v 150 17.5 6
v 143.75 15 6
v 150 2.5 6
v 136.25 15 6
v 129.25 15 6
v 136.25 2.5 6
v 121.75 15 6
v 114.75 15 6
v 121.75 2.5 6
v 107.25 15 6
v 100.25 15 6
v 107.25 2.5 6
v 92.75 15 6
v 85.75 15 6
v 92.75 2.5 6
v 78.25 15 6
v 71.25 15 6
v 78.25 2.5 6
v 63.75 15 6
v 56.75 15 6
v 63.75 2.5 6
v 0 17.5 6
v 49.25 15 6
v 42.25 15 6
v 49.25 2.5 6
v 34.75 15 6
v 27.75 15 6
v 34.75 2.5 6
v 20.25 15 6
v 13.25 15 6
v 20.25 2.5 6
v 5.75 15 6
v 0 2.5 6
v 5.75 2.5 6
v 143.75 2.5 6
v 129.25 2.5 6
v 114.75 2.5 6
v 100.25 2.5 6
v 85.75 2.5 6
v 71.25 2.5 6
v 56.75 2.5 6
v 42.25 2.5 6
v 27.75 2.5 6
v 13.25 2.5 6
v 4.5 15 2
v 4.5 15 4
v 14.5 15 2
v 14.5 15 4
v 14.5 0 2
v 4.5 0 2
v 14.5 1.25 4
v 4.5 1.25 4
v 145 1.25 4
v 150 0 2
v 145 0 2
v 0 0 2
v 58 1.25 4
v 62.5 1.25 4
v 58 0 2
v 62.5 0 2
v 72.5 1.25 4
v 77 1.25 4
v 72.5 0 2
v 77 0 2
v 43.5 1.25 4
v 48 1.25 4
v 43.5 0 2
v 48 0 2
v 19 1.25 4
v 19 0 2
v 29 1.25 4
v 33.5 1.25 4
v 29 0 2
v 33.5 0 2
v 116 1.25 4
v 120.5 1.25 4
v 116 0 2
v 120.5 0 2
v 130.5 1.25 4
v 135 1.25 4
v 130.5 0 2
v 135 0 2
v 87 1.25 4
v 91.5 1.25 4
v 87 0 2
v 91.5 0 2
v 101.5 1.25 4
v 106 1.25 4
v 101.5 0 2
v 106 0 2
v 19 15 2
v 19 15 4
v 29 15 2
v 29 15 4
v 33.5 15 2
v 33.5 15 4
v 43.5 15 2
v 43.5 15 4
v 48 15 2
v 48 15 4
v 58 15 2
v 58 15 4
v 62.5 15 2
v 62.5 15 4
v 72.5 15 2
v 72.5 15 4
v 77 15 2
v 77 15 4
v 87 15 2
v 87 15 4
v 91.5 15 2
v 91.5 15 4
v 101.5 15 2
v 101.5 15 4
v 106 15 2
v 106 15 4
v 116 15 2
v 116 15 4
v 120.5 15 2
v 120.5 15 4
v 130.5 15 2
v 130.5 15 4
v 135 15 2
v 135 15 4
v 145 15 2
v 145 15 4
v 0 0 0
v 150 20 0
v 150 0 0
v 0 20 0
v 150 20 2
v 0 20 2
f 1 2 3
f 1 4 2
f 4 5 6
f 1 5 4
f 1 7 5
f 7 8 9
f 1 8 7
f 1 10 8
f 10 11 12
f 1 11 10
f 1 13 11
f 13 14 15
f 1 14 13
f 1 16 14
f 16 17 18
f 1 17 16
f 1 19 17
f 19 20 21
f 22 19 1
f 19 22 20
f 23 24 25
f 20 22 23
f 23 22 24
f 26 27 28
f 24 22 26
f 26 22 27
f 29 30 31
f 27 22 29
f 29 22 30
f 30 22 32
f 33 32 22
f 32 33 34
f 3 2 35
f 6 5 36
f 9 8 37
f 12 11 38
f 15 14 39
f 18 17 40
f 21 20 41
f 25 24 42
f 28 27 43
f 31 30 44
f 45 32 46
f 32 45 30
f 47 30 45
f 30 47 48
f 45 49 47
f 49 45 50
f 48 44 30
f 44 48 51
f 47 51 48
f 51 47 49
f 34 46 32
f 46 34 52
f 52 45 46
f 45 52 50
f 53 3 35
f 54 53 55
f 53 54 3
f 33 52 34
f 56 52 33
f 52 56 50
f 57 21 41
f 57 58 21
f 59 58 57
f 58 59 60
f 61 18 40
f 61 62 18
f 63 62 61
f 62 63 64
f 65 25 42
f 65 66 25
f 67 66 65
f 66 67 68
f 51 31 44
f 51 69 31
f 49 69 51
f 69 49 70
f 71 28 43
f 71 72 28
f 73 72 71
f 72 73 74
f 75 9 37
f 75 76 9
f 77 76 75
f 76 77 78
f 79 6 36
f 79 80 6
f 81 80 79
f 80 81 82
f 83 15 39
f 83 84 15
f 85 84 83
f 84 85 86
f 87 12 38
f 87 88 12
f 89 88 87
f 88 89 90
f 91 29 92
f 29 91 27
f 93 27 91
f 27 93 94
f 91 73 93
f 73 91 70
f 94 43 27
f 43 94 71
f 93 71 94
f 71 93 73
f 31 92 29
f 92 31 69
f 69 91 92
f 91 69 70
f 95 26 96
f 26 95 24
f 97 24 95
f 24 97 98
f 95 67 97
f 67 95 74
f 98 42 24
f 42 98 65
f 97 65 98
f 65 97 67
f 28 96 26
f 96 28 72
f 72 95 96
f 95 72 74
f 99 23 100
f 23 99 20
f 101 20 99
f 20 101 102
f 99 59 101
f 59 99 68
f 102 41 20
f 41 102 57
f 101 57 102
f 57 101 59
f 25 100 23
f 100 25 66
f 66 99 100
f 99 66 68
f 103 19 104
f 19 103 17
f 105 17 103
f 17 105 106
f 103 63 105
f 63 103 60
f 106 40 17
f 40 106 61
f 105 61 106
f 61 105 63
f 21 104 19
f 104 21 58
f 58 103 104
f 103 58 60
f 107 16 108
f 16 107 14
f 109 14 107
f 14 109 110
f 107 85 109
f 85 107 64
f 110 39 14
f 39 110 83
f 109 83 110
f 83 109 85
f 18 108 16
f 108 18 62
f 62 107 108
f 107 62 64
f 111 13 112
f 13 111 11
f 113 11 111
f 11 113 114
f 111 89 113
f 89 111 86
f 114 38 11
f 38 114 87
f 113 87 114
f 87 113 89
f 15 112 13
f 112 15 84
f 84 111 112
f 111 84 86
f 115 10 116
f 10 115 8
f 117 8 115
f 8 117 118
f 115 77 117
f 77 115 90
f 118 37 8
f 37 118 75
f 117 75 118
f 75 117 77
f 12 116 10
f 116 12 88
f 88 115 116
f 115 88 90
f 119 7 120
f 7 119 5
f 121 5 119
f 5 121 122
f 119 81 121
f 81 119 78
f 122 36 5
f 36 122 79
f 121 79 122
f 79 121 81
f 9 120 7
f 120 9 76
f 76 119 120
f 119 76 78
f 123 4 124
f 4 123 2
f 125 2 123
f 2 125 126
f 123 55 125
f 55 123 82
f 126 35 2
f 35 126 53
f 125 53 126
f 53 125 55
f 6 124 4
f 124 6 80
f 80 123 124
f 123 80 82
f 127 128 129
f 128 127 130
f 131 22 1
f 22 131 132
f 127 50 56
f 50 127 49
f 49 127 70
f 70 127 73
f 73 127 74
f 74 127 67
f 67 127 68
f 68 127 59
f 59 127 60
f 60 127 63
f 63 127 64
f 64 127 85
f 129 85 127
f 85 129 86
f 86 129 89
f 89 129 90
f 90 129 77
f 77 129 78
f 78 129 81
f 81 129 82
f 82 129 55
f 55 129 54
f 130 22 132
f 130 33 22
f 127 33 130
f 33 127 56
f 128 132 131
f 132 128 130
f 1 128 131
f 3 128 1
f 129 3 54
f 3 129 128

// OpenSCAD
$fn=32;

// print selection. Possible choices: bar,connector
print="bar";
// pipe diameter
pipe_dia=6;

// bar length
bar_length=150;
// bar width
bar_width=20;
// bar height
bar_height=6;
// bar bottom height
bar_bottom=2;
// connector_width
connector_width=10;
// space between connector cutouts
space=4.5;

connector_height=bar_height-bar_bottom;
connector_depth=bar_width-bar_width/4;
gap=0.2;

if(print=="bar")
{
    bar();
}
if(print=="connector")
{
    connector();
}
else
{
    echo("Unknown print selection");
}


module bar()
{
    difference()
    {        
        bar_shape();
        for(i=[space:space+connector_width:bar_length-space-connector_width])
        {
            translate([i,0,0])
            {
                #connector_shape();
            }
        }
    }
}

module connector()
{
    resize([connector_width-2*gap,connector_depth-2*gap,connector_height-2*gap])
    {
        connector_shape();
    }
    translate([connector_width-(connector_width/4)/2-2*gap,
               (pipe_dia+4)/2+(bar_width/4)/2,
               (pipe_dia+4)/2+bar_height-1.5])
    {
        rotate([270,0,90])
        {
            difference()
            {
                union(){    
                    translate([-(pipe_dia+4)/2,0,0])
                    {
                        cube([pipe_dia+4,(pipe_dia+4)/2,connector_width-connector_width/4-2*gap]);
                    }
                    cylinder(d=pipe_dia+4,h=connector_width-connector_width/4-2*gap);
                }
                cylinder(d=pipe_dia,h=connector_width-connector_width/4-2*gap);
                translate([-(pipe_dia+2)/2,-(pipe_dia+2)/2,0])
                {
                    rotate([0,0,-20])
                    {
                        #cube([pipe_dia+2,(pipe_dia+2)/2,connector_width-connector_width/4]);
                    }
                }
            }
        }
    }
}

module connector_shape()
{
    intersection()
    {
        translate([0,0,bar_bottom])
        {
            hull()
            {
                cube([connector_width,connector_depth,connector_height/2]);
                translate([(connector_width/4)/2,0,connector_height/2])
                {
                    cube([connector_width-connector_width/4,connector_depth,connector_height/2]);
                }
            }
        }
        bar_shape();
    }
}

module bar_shape()
{
    bottom=2;
    
    hull()
    {
        cube([bar_length,bar_width,bottom]);
        translate([0,(bar_width/4)/2,bottom])
        {
            cube([bar_length,bar_width-(bar_width/4),bar_height-bottom]);
        }
    }
}
